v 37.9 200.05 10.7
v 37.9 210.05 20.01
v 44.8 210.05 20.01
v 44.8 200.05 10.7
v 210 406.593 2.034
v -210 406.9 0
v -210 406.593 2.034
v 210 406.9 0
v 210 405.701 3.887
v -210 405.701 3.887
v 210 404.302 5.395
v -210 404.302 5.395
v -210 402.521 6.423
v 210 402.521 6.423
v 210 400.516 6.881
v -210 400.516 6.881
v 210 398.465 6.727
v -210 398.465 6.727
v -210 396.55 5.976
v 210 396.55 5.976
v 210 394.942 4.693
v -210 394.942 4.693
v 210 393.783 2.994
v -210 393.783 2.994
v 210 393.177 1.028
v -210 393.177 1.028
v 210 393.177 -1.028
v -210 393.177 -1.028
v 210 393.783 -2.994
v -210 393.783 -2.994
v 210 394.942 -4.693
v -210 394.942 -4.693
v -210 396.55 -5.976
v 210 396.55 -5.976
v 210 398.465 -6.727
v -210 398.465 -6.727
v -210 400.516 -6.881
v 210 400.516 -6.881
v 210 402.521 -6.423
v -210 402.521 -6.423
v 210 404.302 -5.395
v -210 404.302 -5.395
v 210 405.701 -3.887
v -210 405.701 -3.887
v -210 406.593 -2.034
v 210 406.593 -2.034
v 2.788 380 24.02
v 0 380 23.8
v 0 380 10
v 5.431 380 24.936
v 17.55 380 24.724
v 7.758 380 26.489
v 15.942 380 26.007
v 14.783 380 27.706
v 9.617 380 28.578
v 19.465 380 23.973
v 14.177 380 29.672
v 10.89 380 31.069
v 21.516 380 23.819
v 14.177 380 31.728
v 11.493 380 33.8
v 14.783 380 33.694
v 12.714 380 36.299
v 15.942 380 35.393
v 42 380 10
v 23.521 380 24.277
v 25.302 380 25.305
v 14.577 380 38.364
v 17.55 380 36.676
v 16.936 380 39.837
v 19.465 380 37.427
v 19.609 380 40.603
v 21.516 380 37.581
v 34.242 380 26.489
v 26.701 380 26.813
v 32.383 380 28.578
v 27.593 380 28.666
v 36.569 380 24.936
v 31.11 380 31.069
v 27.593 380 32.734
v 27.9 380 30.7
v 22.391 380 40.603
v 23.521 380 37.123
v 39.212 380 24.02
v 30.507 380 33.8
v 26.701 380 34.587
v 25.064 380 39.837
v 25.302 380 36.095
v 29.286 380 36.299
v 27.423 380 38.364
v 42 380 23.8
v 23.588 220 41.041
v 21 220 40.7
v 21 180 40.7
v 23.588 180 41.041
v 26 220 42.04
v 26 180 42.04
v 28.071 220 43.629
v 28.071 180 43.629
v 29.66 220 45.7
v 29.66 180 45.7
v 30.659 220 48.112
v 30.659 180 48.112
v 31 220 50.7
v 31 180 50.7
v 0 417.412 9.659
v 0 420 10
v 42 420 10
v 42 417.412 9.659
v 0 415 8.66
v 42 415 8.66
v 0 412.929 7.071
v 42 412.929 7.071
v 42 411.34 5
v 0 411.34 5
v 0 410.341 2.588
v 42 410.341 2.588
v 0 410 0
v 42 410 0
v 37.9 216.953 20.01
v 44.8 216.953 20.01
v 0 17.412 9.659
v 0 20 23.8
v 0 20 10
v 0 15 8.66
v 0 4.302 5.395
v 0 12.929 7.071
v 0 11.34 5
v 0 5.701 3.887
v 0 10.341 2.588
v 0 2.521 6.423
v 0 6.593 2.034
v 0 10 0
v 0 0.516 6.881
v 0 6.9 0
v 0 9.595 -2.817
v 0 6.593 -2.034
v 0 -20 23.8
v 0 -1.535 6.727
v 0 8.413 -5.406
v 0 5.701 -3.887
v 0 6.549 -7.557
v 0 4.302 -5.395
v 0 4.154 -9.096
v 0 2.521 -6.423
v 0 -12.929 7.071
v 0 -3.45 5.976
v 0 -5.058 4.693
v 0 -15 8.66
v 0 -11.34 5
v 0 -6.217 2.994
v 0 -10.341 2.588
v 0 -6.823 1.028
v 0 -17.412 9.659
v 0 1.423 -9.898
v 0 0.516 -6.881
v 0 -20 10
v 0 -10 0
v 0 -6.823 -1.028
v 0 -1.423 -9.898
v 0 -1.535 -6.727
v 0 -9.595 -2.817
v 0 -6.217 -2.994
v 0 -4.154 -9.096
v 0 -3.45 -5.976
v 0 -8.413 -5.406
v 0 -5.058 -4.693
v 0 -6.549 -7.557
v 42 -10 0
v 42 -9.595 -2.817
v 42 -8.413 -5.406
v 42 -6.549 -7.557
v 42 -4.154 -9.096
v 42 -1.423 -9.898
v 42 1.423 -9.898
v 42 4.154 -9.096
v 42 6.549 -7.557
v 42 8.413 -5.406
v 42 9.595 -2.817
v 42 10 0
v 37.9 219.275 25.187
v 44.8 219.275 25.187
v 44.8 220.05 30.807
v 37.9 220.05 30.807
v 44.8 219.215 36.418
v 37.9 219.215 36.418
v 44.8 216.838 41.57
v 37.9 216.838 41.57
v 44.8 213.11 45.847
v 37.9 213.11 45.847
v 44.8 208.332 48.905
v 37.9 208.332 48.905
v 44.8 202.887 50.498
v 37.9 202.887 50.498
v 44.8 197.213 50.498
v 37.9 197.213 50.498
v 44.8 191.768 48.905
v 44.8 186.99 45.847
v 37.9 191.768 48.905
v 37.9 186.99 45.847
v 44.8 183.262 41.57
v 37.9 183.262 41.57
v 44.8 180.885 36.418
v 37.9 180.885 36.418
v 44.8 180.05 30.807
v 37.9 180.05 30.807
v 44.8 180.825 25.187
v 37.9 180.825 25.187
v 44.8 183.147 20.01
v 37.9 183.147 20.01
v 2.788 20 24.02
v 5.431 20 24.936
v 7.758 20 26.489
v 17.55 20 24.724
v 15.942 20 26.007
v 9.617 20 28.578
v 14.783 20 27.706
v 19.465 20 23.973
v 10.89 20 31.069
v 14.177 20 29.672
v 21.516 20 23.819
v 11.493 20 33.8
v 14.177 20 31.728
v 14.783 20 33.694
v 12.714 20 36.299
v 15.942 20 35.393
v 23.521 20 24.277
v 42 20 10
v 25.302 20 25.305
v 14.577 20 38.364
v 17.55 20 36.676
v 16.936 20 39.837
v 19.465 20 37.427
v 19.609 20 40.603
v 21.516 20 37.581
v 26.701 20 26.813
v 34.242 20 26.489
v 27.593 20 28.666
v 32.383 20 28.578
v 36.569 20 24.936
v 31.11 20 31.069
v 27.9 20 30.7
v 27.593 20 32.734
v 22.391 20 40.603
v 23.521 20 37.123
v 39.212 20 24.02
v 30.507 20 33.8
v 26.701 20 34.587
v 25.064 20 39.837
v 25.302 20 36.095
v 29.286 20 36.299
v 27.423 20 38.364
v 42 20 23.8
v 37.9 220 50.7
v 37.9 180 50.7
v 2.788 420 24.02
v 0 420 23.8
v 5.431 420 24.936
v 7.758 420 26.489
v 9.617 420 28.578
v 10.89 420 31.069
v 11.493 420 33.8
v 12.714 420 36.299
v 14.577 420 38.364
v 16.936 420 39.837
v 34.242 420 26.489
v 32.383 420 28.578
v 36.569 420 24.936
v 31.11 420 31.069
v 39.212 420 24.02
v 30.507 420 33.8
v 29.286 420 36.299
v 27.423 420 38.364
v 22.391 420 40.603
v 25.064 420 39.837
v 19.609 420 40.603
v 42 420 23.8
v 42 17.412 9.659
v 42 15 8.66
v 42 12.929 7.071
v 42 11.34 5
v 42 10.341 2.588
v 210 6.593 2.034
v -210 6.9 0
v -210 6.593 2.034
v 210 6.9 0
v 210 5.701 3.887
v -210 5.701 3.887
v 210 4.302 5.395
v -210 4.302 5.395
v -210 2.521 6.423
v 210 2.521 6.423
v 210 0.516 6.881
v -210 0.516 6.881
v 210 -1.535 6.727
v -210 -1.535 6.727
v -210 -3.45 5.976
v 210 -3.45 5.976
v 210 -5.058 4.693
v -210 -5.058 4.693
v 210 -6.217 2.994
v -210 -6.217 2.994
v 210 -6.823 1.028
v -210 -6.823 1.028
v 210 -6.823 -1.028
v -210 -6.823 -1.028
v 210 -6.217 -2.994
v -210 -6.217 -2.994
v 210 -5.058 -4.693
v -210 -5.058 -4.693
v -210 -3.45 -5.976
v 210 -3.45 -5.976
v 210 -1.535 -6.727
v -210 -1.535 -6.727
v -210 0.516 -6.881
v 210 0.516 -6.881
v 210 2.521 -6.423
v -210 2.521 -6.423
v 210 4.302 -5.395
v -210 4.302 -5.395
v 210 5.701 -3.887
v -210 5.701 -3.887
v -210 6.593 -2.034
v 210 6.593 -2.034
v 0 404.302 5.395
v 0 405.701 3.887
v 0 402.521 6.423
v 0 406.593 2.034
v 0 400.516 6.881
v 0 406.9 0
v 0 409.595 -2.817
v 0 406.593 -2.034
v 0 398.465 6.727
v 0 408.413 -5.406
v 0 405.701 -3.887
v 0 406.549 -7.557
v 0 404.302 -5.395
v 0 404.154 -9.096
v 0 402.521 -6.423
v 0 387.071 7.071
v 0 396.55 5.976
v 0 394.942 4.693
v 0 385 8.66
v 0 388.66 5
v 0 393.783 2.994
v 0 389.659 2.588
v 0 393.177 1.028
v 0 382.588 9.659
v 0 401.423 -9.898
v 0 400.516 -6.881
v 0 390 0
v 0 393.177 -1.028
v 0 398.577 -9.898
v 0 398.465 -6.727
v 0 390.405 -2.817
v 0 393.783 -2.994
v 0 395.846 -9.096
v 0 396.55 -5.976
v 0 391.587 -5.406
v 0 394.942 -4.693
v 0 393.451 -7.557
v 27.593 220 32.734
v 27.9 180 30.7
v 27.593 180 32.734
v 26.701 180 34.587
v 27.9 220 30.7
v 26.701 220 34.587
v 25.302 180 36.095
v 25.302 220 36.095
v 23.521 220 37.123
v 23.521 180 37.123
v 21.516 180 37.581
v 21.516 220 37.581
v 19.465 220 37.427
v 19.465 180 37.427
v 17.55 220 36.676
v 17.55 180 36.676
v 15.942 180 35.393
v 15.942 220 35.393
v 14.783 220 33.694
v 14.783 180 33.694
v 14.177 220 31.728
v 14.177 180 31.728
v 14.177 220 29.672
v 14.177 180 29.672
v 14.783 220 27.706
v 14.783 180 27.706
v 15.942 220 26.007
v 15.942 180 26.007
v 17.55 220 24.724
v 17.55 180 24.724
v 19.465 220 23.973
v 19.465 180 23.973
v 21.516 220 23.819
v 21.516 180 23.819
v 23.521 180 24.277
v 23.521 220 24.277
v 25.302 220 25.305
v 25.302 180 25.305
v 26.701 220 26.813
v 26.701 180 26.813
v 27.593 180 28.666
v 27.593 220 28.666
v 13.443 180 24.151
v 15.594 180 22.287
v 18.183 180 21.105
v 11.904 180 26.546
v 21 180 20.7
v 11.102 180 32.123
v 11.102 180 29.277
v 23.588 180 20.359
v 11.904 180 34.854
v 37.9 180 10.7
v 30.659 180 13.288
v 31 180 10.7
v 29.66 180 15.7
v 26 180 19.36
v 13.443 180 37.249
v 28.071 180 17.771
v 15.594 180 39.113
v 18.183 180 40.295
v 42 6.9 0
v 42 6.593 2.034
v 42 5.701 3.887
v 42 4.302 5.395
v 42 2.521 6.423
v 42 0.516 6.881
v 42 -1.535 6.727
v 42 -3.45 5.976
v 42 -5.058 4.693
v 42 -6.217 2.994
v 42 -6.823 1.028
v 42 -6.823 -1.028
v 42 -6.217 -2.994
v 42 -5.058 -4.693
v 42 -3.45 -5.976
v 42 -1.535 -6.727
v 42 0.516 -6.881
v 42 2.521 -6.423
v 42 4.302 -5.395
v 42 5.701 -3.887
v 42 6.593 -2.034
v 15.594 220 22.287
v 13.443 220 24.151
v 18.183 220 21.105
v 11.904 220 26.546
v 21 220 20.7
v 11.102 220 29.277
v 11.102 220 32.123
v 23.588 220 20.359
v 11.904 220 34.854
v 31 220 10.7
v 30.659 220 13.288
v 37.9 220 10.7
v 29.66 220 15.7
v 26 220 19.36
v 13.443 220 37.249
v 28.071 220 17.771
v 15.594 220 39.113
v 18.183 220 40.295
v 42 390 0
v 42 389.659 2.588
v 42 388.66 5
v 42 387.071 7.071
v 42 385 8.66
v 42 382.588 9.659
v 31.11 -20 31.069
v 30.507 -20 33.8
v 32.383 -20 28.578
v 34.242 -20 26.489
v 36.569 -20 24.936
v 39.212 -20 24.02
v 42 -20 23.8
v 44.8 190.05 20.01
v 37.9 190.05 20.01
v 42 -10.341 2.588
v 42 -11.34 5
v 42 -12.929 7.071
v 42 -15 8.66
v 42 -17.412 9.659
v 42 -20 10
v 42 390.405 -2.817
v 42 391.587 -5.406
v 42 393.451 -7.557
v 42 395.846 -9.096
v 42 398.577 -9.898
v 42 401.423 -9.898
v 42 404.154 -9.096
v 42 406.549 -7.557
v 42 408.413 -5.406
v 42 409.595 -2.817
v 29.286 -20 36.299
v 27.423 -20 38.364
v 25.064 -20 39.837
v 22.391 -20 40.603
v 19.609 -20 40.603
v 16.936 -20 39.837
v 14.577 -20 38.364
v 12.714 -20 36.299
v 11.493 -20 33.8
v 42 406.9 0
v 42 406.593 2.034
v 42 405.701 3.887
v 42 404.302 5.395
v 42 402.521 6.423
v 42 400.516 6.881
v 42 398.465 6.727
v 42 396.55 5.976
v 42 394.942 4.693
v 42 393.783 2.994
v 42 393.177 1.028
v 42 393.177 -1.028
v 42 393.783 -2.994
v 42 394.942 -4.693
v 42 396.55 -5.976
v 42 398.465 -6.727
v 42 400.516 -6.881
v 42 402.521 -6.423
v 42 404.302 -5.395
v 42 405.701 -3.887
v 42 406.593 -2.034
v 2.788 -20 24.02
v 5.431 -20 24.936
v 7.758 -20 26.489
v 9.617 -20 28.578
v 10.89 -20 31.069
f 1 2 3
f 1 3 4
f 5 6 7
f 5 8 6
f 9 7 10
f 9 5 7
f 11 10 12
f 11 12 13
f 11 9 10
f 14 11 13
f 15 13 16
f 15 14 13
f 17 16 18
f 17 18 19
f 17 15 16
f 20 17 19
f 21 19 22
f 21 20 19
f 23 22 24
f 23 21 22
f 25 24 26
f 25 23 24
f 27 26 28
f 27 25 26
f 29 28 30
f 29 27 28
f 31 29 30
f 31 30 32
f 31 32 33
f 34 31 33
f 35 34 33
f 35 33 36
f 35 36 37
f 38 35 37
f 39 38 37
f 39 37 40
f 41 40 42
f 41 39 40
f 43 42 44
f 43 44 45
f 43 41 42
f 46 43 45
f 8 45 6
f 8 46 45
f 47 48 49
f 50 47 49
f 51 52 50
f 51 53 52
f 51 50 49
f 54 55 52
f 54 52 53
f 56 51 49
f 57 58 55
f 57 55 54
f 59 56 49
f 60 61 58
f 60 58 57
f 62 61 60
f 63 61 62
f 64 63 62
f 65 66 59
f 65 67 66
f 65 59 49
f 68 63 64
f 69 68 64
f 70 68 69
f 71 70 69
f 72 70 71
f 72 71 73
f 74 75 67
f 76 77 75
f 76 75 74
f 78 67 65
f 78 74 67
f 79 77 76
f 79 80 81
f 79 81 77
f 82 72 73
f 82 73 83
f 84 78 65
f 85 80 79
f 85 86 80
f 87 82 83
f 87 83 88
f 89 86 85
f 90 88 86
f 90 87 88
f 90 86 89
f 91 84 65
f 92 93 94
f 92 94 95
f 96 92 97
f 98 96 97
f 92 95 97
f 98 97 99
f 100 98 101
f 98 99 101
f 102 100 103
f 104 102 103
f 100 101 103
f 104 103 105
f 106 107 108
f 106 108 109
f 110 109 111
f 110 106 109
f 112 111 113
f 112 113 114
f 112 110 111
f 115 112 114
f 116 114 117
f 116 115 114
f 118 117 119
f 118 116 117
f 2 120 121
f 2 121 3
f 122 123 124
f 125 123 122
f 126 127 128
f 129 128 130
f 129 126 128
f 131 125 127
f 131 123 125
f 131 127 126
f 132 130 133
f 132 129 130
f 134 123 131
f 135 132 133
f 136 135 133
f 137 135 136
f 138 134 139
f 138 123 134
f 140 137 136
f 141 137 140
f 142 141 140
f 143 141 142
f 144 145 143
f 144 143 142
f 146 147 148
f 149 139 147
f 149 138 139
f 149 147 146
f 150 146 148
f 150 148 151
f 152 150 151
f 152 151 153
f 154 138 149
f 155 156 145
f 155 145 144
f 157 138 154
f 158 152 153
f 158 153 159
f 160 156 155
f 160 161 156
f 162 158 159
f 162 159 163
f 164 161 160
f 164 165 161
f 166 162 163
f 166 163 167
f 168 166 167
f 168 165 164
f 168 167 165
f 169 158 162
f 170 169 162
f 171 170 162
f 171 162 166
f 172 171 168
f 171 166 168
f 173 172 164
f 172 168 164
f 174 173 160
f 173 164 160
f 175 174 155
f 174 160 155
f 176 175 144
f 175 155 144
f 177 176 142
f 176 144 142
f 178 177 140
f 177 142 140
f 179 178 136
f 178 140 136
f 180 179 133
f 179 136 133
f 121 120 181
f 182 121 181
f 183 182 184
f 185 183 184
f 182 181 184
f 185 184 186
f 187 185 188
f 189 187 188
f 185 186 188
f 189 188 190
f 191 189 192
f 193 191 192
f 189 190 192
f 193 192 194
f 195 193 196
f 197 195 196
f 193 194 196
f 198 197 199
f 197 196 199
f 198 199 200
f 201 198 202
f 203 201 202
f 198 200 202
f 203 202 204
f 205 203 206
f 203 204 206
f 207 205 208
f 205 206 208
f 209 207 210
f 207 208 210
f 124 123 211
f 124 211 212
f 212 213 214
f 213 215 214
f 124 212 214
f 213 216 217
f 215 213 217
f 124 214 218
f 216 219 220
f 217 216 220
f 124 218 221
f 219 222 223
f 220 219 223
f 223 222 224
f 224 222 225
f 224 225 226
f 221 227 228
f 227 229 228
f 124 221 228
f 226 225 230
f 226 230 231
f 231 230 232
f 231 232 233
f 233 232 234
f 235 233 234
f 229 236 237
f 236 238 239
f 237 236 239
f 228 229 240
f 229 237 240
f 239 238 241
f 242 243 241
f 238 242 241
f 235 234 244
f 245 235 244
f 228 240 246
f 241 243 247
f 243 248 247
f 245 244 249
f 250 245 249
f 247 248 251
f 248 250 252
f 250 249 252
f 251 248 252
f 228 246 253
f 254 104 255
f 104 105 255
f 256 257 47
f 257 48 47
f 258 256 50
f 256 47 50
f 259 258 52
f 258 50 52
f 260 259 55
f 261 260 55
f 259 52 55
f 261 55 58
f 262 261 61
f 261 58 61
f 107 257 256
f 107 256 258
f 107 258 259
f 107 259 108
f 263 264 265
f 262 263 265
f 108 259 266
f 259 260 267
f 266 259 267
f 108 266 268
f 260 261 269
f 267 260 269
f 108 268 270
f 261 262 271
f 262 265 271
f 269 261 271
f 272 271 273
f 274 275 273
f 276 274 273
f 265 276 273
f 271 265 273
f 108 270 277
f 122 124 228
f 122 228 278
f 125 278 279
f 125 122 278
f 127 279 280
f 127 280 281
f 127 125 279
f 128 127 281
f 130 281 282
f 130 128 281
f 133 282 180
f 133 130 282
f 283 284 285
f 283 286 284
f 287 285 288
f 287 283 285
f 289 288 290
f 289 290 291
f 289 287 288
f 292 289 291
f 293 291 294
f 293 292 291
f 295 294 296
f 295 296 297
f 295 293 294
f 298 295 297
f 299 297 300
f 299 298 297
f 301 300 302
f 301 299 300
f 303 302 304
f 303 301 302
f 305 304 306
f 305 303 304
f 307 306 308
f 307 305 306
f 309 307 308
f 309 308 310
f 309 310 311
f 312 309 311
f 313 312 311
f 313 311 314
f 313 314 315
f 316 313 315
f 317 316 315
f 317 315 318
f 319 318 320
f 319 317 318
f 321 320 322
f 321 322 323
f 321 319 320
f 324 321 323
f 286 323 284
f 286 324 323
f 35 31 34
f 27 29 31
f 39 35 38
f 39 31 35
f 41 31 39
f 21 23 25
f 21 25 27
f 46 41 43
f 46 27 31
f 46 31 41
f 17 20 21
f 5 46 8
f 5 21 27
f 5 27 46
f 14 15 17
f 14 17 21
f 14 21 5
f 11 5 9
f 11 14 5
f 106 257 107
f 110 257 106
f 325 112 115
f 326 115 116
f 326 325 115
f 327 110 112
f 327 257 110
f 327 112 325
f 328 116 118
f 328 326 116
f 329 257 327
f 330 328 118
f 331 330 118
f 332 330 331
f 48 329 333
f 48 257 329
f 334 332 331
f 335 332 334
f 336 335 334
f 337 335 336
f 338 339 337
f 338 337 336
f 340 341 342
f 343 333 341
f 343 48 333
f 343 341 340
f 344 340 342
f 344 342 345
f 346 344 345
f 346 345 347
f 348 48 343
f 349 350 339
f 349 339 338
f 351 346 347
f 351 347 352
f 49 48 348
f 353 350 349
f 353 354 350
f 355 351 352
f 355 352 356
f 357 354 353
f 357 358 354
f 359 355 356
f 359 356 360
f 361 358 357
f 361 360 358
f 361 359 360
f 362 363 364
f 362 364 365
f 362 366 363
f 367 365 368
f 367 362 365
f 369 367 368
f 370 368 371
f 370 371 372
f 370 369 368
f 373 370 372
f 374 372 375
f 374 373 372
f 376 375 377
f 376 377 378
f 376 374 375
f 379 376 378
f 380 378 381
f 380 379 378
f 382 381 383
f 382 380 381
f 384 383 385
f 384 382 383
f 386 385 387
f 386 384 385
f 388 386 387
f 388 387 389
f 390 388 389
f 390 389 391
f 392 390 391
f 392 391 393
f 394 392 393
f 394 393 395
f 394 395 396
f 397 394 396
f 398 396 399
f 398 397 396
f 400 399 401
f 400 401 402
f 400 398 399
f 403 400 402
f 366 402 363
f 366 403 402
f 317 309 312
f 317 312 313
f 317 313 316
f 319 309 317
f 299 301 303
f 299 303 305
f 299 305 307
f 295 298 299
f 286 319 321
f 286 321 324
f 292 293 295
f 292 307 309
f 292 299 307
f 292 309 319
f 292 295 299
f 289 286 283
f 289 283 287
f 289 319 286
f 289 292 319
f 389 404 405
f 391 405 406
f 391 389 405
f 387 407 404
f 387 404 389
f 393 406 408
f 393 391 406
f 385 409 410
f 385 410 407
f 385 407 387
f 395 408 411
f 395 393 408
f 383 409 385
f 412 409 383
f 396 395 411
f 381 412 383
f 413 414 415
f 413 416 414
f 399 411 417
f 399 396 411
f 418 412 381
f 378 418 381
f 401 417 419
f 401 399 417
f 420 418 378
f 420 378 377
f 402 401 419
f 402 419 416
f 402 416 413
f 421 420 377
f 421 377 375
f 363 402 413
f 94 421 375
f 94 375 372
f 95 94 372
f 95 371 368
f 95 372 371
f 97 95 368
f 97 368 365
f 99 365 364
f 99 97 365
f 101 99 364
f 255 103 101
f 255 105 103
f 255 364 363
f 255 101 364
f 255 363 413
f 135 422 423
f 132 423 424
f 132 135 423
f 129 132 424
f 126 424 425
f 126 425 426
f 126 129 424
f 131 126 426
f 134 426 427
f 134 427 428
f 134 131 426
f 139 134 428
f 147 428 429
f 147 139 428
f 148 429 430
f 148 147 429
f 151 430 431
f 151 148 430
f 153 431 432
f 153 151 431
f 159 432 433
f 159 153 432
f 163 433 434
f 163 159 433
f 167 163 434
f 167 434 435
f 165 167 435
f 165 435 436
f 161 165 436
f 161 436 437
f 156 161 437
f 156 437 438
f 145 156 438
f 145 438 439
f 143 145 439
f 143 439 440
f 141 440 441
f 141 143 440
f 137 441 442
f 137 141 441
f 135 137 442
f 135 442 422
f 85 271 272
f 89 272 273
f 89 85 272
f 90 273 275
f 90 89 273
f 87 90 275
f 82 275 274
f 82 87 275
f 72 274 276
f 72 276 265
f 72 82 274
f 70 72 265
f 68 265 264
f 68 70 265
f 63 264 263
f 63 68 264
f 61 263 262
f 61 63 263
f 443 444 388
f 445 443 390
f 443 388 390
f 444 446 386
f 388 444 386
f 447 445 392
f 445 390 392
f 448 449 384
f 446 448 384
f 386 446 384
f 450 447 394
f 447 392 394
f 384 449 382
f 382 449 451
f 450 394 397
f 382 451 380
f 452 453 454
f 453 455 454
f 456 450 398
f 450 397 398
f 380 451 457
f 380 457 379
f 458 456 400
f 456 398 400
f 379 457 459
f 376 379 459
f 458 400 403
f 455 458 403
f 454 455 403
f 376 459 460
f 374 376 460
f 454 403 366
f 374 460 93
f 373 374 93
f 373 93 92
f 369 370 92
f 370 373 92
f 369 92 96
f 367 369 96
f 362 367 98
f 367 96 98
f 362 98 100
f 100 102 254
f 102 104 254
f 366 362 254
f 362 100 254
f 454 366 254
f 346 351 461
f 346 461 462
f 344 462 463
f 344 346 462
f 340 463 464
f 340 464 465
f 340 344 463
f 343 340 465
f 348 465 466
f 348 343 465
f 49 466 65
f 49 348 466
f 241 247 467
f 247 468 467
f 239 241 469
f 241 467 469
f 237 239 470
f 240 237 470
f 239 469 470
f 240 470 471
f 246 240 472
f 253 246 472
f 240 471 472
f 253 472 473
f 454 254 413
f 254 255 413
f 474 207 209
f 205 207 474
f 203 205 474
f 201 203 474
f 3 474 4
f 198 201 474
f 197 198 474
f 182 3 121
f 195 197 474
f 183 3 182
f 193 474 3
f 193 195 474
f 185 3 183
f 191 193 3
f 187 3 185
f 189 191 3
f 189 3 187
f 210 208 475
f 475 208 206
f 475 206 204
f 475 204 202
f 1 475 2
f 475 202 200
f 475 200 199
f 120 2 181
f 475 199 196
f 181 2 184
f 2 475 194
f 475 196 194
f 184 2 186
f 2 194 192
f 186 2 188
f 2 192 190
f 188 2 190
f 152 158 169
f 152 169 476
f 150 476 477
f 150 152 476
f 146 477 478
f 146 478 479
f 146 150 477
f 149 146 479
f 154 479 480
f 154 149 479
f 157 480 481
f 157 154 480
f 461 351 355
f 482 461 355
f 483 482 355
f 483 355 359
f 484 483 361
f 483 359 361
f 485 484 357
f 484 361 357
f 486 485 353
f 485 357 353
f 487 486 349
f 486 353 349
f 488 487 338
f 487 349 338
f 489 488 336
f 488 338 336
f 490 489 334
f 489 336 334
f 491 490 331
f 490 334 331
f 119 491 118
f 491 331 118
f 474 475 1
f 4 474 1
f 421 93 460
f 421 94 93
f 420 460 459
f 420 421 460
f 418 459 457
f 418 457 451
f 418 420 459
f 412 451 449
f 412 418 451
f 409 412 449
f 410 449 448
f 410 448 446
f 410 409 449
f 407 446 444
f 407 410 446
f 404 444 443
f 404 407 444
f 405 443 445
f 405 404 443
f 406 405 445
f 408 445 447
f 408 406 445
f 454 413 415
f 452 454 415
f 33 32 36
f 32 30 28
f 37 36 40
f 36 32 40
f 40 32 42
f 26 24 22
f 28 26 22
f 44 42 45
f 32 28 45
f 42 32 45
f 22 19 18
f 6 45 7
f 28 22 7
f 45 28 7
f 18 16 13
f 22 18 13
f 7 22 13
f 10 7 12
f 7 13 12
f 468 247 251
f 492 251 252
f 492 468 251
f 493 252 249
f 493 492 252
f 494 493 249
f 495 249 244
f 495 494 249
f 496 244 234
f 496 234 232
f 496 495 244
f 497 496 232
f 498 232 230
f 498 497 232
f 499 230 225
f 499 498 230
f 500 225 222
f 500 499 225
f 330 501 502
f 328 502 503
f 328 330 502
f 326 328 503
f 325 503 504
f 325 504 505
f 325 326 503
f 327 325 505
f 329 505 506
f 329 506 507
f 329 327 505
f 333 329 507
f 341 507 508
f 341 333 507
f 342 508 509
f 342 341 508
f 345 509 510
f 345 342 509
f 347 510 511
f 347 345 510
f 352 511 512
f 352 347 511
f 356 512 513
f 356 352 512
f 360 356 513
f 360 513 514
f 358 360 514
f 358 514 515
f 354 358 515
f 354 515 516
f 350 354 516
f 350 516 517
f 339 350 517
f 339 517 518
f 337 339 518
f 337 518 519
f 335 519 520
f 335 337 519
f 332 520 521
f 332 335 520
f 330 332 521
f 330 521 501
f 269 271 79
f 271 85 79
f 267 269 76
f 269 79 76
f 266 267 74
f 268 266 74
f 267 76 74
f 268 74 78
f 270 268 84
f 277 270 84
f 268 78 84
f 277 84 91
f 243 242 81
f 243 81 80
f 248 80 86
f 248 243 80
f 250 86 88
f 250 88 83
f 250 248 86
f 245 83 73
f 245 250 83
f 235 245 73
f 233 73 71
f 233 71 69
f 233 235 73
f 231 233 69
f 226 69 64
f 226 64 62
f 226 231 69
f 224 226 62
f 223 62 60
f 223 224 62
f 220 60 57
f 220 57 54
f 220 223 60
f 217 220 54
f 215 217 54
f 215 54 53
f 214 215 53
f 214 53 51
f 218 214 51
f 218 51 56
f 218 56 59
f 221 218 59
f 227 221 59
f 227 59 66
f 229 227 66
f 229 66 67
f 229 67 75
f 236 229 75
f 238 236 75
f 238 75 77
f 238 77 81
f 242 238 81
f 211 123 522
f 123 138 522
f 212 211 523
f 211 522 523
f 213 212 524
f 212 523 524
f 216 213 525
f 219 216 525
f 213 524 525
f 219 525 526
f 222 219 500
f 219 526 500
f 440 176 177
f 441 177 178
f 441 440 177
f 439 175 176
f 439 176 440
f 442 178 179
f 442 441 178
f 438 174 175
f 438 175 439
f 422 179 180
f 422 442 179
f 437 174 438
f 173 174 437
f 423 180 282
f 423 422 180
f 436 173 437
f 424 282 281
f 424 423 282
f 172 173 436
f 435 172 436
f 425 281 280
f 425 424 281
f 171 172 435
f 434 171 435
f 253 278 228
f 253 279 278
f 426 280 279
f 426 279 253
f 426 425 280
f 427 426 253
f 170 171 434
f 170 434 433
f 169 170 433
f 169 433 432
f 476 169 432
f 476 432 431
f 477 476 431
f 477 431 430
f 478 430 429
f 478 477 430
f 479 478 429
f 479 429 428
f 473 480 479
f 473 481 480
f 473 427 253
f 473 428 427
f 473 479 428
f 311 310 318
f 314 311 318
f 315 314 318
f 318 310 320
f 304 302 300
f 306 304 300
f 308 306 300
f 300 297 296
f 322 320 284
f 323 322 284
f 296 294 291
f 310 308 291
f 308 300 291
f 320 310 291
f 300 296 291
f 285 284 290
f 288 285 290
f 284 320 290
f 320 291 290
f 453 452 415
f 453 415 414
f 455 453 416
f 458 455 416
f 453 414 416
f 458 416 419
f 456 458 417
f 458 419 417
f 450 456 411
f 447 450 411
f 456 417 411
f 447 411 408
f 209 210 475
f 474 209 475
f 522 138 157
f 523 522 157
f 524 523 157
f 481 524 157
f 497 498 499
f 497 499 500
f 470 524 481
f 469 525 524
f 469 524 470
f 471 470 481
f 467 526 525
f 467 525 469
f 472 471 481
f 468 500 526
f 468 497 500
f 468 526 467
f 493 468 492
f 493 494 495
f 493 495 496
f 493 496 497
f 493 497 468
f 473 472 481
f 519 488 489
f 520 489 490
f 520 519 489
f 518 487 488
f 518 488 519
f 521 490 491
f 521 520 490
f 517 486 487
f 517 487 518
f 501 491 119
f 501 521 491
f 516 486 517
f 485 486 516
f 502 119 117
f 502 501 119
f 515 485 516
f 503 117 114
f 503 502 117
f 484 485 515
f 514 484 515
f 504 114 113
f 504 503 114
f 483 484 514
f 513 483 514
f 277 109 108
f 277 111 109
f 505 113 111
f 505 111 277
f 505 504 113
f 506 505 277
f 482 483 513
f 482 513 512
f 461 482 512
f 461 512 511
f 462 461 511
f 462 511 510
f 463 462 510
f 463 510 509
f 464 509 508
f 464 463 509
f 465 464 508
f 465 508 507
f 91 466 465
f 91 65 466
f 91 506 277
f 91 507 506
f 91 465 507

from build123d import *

# Parameters (mm, degrees)
SKETCH_R     = 6.9
PAD_DEPTH    = 210
SKETCH013_R  = 6.9
PAD003_DEPTH = 210
SKETCH017_R  = 6.9
PAD007_DEPTH = 20
PAD008_DEPTH = 6.9
SKETCH011_R  = 6.9
PAD001_DEPTH = 42
SKETCH012_R  = 6.9
PAD002_DEPTH = 42
SKETCH014_R  = 6.9
PAD004_DEPTH = 20
SKETCH015_R  = 6.9
PAD005_DEPTH = 20
SKETCH016_R  = 6.9
PAD006_DEPTH = 440


with BuildPart() as x_axis_rail1:
    # Sketch → Pad (new body, symmetric)
    with BuildSketch(Plane.YZ):
        Circle(SKETCH_R)
    extrude(amount=PAD_DEPTH, both=True)


with BuildPart() as x_axis_rail2:
    # Sketch013 → Pad003 (new body, symmetric)
    with BuildSketch(Plane(origin=(0, 400, 0), x_dir=(0, 1, 0), z_dir=(1, 0, 0))):
        Circle(SKETCH013_R)
    extrude(amount=PAD003_DEPTH, both=True)


with BuildPart() as y_axis_sled:
    # Sketch017 → Pad007 (new body, symmetric)
    with BuildSketch(Plane.XZ.offset(-200)):
        with BuildLine():
            ThreePointArc((21, 40.7), (11, 30.7), (21, 20.7))
            ThreePointArc((31, 10.7), (28.071068, 17.771068), (21, 20.7))
            Line((37.9, 10.7), (31, 10.7))
            Line((37.9, 50.7), (37.9, 10.7))
            Line((31, 50.7), (37.9, 50.7))
            ThreePointArc((21, 40.7), (28.071068, 43.628932), (31, 50.7))
        make_face()
        with Locations((21, 30.7)):
            Circle(SKETCH017_R, mode=Mode.SUBTRACT)
    extrude(amount=PAD007_DEPTH, both=True)


with BuildPart() as a_axis:
    # Sketch018 → Pad008 (new body)
    with BuildSketch(Plane.YZ.offset(37.9)):
        with BuildLine():
            ThreePointArc((216.953369, 20.01), (200.05, 50.7), (183.146631, 20.01))
            Line((183.146631, 20.01), (190.05, 20.01))
            Line((190.05, 20.01), (200.05, 10.7))
            Line((210.05, 20.01), (200.05, 10.7))
            Line((216.953369, 20.01), (210.05, 20.01))
        make_face()
    extrude(amount=PAD008_DEPTH)


with BuildPart() as x_axis_sled1:
    # Sketch011 → Pad001 (new body)
    with BuildSketch(Plane.YZ):
        with BuildLine():
            Line((-20, 16.9), (20, 16.9))
            Line((20, 16.9), (20, 10))
            ThreePointArc((20, 10), (12.928932, 7.071068), (10, 0))
            ThreePointArc((-10, 0), (0, -9.999999), (10, 0))
            ThreePointArc((-10, 0), (-12.928932, 7.071068), (-20, 10))
            Line((-20, 10), (-20, 16.9))
        make_face()
        Circle(SKETCH011_R, mode=Mode.SUBTRACT)
    extrude(amount=PAD001_DEPTH)


with BuildPart() as x_axis_sled2:
    # Sketch012 → Pad002 (new body)
    with BuildSketch(Plane(origin=(0, 400, 0), x_dir=(0, 1, 0), z_dir=(1, 0, 0))):
        with BuildLine():
            Line((-20, 16.9), (20, 16.9))
            Line((20, 16.9), (20, 10))
            ThreePointArc((20, 10), (12.928932, 7.071068), (10, 0))
            ThreePointArc((-10, 0), (0, -9.999999), (10, 0))
            ThreePointArc((-10, 0), (-12.928932, 7.071068), (-20, 10))
            Line((-20, 10), (-20, 16.9))
        make_face()
        Circle(SKETCH012_R, mode=Mode.SUBTRACT)
    extrude(amount=PAD002_DEPTH)


with BuildPart() as y_axis_socket1:
    # Sketch014 → Pad004 (new body, symmetric)
    with BuildSketch(Plane.XZ):
        with BuildLine():
            Line((0, 23.8), (0, 16.9))
            Line((0, 16.9), (42, 16.9))
            Line((42, 16.9), (42, 23.8))
            ThreePointArc((30.507366, 33.8), (34.242407, 26.488514), (42, 23.8))
            ThreePointArc((30.507366, 33.8), (21, 40.7), (11.492634, 33.8))
            ThreePointArc((0, 23.8), (7.757593, 26.488514), (11.492634, 33.8))
        make_face()
        with Locations((21, 30.7)):
            Circle(SKETCH014_R, mode=Mode.SUBTRACT)
    extrude(amount=PAD004_DEPTH, both=True)


with BuildPart() as y_axis_socket2:
    # Sketch015 → Pad005 (new body, symmetric)
    with BuildSketch(Plane.XZ.offset(-400)):
        with BuildLine():
            Line((0, 23.8), (0, 16.9))
            Line((0, 16.9), (42, 16.9))
            Line((42, 16.9), (42, 23.8))
            ThreePointArc((30.507366, 33.8), (34.242407, 26.488514), (42, 23.8))
            ThreePointArc((30.507366, 33.8), (21, 40.7), (11.492634, 33.8))
            ThreePointArc((0, 23.8), (7.757593, 26.488514), (11.492634, 33.8))
        make_face()
        with Locations((21, 30.7)):
            Circle(SKETCH015_R, mode=Mode.SUBTRACT)
    extrude(amount=PAD005_DEPTH, both=True)


with BuildPart() as y_rail:
    # Sketch016 → Pad006 (new body)
    with BuildSketch(Plane.XZ.offset(20)):
        with Locations((21, 30.7)):
            Circle(SKETCH016_R)
    extrude(amount=-PAD006_DEPTH)

    # Fusion: union X_Axis_Sled1, X_Axis_Sled2, Y_Axis_Socket1, Y_Axis_Socket2
    add(x_axis_sled1.part)
    add(x_axis_sled2.part)
    add(y_axis_socket1.part)
    add(y_axis_socket2.part)


solid = Compound([x_axis_rail1.part, x_axis_rail2.part, y_axis_sled.part, a_axis.part, y_rail.part])
